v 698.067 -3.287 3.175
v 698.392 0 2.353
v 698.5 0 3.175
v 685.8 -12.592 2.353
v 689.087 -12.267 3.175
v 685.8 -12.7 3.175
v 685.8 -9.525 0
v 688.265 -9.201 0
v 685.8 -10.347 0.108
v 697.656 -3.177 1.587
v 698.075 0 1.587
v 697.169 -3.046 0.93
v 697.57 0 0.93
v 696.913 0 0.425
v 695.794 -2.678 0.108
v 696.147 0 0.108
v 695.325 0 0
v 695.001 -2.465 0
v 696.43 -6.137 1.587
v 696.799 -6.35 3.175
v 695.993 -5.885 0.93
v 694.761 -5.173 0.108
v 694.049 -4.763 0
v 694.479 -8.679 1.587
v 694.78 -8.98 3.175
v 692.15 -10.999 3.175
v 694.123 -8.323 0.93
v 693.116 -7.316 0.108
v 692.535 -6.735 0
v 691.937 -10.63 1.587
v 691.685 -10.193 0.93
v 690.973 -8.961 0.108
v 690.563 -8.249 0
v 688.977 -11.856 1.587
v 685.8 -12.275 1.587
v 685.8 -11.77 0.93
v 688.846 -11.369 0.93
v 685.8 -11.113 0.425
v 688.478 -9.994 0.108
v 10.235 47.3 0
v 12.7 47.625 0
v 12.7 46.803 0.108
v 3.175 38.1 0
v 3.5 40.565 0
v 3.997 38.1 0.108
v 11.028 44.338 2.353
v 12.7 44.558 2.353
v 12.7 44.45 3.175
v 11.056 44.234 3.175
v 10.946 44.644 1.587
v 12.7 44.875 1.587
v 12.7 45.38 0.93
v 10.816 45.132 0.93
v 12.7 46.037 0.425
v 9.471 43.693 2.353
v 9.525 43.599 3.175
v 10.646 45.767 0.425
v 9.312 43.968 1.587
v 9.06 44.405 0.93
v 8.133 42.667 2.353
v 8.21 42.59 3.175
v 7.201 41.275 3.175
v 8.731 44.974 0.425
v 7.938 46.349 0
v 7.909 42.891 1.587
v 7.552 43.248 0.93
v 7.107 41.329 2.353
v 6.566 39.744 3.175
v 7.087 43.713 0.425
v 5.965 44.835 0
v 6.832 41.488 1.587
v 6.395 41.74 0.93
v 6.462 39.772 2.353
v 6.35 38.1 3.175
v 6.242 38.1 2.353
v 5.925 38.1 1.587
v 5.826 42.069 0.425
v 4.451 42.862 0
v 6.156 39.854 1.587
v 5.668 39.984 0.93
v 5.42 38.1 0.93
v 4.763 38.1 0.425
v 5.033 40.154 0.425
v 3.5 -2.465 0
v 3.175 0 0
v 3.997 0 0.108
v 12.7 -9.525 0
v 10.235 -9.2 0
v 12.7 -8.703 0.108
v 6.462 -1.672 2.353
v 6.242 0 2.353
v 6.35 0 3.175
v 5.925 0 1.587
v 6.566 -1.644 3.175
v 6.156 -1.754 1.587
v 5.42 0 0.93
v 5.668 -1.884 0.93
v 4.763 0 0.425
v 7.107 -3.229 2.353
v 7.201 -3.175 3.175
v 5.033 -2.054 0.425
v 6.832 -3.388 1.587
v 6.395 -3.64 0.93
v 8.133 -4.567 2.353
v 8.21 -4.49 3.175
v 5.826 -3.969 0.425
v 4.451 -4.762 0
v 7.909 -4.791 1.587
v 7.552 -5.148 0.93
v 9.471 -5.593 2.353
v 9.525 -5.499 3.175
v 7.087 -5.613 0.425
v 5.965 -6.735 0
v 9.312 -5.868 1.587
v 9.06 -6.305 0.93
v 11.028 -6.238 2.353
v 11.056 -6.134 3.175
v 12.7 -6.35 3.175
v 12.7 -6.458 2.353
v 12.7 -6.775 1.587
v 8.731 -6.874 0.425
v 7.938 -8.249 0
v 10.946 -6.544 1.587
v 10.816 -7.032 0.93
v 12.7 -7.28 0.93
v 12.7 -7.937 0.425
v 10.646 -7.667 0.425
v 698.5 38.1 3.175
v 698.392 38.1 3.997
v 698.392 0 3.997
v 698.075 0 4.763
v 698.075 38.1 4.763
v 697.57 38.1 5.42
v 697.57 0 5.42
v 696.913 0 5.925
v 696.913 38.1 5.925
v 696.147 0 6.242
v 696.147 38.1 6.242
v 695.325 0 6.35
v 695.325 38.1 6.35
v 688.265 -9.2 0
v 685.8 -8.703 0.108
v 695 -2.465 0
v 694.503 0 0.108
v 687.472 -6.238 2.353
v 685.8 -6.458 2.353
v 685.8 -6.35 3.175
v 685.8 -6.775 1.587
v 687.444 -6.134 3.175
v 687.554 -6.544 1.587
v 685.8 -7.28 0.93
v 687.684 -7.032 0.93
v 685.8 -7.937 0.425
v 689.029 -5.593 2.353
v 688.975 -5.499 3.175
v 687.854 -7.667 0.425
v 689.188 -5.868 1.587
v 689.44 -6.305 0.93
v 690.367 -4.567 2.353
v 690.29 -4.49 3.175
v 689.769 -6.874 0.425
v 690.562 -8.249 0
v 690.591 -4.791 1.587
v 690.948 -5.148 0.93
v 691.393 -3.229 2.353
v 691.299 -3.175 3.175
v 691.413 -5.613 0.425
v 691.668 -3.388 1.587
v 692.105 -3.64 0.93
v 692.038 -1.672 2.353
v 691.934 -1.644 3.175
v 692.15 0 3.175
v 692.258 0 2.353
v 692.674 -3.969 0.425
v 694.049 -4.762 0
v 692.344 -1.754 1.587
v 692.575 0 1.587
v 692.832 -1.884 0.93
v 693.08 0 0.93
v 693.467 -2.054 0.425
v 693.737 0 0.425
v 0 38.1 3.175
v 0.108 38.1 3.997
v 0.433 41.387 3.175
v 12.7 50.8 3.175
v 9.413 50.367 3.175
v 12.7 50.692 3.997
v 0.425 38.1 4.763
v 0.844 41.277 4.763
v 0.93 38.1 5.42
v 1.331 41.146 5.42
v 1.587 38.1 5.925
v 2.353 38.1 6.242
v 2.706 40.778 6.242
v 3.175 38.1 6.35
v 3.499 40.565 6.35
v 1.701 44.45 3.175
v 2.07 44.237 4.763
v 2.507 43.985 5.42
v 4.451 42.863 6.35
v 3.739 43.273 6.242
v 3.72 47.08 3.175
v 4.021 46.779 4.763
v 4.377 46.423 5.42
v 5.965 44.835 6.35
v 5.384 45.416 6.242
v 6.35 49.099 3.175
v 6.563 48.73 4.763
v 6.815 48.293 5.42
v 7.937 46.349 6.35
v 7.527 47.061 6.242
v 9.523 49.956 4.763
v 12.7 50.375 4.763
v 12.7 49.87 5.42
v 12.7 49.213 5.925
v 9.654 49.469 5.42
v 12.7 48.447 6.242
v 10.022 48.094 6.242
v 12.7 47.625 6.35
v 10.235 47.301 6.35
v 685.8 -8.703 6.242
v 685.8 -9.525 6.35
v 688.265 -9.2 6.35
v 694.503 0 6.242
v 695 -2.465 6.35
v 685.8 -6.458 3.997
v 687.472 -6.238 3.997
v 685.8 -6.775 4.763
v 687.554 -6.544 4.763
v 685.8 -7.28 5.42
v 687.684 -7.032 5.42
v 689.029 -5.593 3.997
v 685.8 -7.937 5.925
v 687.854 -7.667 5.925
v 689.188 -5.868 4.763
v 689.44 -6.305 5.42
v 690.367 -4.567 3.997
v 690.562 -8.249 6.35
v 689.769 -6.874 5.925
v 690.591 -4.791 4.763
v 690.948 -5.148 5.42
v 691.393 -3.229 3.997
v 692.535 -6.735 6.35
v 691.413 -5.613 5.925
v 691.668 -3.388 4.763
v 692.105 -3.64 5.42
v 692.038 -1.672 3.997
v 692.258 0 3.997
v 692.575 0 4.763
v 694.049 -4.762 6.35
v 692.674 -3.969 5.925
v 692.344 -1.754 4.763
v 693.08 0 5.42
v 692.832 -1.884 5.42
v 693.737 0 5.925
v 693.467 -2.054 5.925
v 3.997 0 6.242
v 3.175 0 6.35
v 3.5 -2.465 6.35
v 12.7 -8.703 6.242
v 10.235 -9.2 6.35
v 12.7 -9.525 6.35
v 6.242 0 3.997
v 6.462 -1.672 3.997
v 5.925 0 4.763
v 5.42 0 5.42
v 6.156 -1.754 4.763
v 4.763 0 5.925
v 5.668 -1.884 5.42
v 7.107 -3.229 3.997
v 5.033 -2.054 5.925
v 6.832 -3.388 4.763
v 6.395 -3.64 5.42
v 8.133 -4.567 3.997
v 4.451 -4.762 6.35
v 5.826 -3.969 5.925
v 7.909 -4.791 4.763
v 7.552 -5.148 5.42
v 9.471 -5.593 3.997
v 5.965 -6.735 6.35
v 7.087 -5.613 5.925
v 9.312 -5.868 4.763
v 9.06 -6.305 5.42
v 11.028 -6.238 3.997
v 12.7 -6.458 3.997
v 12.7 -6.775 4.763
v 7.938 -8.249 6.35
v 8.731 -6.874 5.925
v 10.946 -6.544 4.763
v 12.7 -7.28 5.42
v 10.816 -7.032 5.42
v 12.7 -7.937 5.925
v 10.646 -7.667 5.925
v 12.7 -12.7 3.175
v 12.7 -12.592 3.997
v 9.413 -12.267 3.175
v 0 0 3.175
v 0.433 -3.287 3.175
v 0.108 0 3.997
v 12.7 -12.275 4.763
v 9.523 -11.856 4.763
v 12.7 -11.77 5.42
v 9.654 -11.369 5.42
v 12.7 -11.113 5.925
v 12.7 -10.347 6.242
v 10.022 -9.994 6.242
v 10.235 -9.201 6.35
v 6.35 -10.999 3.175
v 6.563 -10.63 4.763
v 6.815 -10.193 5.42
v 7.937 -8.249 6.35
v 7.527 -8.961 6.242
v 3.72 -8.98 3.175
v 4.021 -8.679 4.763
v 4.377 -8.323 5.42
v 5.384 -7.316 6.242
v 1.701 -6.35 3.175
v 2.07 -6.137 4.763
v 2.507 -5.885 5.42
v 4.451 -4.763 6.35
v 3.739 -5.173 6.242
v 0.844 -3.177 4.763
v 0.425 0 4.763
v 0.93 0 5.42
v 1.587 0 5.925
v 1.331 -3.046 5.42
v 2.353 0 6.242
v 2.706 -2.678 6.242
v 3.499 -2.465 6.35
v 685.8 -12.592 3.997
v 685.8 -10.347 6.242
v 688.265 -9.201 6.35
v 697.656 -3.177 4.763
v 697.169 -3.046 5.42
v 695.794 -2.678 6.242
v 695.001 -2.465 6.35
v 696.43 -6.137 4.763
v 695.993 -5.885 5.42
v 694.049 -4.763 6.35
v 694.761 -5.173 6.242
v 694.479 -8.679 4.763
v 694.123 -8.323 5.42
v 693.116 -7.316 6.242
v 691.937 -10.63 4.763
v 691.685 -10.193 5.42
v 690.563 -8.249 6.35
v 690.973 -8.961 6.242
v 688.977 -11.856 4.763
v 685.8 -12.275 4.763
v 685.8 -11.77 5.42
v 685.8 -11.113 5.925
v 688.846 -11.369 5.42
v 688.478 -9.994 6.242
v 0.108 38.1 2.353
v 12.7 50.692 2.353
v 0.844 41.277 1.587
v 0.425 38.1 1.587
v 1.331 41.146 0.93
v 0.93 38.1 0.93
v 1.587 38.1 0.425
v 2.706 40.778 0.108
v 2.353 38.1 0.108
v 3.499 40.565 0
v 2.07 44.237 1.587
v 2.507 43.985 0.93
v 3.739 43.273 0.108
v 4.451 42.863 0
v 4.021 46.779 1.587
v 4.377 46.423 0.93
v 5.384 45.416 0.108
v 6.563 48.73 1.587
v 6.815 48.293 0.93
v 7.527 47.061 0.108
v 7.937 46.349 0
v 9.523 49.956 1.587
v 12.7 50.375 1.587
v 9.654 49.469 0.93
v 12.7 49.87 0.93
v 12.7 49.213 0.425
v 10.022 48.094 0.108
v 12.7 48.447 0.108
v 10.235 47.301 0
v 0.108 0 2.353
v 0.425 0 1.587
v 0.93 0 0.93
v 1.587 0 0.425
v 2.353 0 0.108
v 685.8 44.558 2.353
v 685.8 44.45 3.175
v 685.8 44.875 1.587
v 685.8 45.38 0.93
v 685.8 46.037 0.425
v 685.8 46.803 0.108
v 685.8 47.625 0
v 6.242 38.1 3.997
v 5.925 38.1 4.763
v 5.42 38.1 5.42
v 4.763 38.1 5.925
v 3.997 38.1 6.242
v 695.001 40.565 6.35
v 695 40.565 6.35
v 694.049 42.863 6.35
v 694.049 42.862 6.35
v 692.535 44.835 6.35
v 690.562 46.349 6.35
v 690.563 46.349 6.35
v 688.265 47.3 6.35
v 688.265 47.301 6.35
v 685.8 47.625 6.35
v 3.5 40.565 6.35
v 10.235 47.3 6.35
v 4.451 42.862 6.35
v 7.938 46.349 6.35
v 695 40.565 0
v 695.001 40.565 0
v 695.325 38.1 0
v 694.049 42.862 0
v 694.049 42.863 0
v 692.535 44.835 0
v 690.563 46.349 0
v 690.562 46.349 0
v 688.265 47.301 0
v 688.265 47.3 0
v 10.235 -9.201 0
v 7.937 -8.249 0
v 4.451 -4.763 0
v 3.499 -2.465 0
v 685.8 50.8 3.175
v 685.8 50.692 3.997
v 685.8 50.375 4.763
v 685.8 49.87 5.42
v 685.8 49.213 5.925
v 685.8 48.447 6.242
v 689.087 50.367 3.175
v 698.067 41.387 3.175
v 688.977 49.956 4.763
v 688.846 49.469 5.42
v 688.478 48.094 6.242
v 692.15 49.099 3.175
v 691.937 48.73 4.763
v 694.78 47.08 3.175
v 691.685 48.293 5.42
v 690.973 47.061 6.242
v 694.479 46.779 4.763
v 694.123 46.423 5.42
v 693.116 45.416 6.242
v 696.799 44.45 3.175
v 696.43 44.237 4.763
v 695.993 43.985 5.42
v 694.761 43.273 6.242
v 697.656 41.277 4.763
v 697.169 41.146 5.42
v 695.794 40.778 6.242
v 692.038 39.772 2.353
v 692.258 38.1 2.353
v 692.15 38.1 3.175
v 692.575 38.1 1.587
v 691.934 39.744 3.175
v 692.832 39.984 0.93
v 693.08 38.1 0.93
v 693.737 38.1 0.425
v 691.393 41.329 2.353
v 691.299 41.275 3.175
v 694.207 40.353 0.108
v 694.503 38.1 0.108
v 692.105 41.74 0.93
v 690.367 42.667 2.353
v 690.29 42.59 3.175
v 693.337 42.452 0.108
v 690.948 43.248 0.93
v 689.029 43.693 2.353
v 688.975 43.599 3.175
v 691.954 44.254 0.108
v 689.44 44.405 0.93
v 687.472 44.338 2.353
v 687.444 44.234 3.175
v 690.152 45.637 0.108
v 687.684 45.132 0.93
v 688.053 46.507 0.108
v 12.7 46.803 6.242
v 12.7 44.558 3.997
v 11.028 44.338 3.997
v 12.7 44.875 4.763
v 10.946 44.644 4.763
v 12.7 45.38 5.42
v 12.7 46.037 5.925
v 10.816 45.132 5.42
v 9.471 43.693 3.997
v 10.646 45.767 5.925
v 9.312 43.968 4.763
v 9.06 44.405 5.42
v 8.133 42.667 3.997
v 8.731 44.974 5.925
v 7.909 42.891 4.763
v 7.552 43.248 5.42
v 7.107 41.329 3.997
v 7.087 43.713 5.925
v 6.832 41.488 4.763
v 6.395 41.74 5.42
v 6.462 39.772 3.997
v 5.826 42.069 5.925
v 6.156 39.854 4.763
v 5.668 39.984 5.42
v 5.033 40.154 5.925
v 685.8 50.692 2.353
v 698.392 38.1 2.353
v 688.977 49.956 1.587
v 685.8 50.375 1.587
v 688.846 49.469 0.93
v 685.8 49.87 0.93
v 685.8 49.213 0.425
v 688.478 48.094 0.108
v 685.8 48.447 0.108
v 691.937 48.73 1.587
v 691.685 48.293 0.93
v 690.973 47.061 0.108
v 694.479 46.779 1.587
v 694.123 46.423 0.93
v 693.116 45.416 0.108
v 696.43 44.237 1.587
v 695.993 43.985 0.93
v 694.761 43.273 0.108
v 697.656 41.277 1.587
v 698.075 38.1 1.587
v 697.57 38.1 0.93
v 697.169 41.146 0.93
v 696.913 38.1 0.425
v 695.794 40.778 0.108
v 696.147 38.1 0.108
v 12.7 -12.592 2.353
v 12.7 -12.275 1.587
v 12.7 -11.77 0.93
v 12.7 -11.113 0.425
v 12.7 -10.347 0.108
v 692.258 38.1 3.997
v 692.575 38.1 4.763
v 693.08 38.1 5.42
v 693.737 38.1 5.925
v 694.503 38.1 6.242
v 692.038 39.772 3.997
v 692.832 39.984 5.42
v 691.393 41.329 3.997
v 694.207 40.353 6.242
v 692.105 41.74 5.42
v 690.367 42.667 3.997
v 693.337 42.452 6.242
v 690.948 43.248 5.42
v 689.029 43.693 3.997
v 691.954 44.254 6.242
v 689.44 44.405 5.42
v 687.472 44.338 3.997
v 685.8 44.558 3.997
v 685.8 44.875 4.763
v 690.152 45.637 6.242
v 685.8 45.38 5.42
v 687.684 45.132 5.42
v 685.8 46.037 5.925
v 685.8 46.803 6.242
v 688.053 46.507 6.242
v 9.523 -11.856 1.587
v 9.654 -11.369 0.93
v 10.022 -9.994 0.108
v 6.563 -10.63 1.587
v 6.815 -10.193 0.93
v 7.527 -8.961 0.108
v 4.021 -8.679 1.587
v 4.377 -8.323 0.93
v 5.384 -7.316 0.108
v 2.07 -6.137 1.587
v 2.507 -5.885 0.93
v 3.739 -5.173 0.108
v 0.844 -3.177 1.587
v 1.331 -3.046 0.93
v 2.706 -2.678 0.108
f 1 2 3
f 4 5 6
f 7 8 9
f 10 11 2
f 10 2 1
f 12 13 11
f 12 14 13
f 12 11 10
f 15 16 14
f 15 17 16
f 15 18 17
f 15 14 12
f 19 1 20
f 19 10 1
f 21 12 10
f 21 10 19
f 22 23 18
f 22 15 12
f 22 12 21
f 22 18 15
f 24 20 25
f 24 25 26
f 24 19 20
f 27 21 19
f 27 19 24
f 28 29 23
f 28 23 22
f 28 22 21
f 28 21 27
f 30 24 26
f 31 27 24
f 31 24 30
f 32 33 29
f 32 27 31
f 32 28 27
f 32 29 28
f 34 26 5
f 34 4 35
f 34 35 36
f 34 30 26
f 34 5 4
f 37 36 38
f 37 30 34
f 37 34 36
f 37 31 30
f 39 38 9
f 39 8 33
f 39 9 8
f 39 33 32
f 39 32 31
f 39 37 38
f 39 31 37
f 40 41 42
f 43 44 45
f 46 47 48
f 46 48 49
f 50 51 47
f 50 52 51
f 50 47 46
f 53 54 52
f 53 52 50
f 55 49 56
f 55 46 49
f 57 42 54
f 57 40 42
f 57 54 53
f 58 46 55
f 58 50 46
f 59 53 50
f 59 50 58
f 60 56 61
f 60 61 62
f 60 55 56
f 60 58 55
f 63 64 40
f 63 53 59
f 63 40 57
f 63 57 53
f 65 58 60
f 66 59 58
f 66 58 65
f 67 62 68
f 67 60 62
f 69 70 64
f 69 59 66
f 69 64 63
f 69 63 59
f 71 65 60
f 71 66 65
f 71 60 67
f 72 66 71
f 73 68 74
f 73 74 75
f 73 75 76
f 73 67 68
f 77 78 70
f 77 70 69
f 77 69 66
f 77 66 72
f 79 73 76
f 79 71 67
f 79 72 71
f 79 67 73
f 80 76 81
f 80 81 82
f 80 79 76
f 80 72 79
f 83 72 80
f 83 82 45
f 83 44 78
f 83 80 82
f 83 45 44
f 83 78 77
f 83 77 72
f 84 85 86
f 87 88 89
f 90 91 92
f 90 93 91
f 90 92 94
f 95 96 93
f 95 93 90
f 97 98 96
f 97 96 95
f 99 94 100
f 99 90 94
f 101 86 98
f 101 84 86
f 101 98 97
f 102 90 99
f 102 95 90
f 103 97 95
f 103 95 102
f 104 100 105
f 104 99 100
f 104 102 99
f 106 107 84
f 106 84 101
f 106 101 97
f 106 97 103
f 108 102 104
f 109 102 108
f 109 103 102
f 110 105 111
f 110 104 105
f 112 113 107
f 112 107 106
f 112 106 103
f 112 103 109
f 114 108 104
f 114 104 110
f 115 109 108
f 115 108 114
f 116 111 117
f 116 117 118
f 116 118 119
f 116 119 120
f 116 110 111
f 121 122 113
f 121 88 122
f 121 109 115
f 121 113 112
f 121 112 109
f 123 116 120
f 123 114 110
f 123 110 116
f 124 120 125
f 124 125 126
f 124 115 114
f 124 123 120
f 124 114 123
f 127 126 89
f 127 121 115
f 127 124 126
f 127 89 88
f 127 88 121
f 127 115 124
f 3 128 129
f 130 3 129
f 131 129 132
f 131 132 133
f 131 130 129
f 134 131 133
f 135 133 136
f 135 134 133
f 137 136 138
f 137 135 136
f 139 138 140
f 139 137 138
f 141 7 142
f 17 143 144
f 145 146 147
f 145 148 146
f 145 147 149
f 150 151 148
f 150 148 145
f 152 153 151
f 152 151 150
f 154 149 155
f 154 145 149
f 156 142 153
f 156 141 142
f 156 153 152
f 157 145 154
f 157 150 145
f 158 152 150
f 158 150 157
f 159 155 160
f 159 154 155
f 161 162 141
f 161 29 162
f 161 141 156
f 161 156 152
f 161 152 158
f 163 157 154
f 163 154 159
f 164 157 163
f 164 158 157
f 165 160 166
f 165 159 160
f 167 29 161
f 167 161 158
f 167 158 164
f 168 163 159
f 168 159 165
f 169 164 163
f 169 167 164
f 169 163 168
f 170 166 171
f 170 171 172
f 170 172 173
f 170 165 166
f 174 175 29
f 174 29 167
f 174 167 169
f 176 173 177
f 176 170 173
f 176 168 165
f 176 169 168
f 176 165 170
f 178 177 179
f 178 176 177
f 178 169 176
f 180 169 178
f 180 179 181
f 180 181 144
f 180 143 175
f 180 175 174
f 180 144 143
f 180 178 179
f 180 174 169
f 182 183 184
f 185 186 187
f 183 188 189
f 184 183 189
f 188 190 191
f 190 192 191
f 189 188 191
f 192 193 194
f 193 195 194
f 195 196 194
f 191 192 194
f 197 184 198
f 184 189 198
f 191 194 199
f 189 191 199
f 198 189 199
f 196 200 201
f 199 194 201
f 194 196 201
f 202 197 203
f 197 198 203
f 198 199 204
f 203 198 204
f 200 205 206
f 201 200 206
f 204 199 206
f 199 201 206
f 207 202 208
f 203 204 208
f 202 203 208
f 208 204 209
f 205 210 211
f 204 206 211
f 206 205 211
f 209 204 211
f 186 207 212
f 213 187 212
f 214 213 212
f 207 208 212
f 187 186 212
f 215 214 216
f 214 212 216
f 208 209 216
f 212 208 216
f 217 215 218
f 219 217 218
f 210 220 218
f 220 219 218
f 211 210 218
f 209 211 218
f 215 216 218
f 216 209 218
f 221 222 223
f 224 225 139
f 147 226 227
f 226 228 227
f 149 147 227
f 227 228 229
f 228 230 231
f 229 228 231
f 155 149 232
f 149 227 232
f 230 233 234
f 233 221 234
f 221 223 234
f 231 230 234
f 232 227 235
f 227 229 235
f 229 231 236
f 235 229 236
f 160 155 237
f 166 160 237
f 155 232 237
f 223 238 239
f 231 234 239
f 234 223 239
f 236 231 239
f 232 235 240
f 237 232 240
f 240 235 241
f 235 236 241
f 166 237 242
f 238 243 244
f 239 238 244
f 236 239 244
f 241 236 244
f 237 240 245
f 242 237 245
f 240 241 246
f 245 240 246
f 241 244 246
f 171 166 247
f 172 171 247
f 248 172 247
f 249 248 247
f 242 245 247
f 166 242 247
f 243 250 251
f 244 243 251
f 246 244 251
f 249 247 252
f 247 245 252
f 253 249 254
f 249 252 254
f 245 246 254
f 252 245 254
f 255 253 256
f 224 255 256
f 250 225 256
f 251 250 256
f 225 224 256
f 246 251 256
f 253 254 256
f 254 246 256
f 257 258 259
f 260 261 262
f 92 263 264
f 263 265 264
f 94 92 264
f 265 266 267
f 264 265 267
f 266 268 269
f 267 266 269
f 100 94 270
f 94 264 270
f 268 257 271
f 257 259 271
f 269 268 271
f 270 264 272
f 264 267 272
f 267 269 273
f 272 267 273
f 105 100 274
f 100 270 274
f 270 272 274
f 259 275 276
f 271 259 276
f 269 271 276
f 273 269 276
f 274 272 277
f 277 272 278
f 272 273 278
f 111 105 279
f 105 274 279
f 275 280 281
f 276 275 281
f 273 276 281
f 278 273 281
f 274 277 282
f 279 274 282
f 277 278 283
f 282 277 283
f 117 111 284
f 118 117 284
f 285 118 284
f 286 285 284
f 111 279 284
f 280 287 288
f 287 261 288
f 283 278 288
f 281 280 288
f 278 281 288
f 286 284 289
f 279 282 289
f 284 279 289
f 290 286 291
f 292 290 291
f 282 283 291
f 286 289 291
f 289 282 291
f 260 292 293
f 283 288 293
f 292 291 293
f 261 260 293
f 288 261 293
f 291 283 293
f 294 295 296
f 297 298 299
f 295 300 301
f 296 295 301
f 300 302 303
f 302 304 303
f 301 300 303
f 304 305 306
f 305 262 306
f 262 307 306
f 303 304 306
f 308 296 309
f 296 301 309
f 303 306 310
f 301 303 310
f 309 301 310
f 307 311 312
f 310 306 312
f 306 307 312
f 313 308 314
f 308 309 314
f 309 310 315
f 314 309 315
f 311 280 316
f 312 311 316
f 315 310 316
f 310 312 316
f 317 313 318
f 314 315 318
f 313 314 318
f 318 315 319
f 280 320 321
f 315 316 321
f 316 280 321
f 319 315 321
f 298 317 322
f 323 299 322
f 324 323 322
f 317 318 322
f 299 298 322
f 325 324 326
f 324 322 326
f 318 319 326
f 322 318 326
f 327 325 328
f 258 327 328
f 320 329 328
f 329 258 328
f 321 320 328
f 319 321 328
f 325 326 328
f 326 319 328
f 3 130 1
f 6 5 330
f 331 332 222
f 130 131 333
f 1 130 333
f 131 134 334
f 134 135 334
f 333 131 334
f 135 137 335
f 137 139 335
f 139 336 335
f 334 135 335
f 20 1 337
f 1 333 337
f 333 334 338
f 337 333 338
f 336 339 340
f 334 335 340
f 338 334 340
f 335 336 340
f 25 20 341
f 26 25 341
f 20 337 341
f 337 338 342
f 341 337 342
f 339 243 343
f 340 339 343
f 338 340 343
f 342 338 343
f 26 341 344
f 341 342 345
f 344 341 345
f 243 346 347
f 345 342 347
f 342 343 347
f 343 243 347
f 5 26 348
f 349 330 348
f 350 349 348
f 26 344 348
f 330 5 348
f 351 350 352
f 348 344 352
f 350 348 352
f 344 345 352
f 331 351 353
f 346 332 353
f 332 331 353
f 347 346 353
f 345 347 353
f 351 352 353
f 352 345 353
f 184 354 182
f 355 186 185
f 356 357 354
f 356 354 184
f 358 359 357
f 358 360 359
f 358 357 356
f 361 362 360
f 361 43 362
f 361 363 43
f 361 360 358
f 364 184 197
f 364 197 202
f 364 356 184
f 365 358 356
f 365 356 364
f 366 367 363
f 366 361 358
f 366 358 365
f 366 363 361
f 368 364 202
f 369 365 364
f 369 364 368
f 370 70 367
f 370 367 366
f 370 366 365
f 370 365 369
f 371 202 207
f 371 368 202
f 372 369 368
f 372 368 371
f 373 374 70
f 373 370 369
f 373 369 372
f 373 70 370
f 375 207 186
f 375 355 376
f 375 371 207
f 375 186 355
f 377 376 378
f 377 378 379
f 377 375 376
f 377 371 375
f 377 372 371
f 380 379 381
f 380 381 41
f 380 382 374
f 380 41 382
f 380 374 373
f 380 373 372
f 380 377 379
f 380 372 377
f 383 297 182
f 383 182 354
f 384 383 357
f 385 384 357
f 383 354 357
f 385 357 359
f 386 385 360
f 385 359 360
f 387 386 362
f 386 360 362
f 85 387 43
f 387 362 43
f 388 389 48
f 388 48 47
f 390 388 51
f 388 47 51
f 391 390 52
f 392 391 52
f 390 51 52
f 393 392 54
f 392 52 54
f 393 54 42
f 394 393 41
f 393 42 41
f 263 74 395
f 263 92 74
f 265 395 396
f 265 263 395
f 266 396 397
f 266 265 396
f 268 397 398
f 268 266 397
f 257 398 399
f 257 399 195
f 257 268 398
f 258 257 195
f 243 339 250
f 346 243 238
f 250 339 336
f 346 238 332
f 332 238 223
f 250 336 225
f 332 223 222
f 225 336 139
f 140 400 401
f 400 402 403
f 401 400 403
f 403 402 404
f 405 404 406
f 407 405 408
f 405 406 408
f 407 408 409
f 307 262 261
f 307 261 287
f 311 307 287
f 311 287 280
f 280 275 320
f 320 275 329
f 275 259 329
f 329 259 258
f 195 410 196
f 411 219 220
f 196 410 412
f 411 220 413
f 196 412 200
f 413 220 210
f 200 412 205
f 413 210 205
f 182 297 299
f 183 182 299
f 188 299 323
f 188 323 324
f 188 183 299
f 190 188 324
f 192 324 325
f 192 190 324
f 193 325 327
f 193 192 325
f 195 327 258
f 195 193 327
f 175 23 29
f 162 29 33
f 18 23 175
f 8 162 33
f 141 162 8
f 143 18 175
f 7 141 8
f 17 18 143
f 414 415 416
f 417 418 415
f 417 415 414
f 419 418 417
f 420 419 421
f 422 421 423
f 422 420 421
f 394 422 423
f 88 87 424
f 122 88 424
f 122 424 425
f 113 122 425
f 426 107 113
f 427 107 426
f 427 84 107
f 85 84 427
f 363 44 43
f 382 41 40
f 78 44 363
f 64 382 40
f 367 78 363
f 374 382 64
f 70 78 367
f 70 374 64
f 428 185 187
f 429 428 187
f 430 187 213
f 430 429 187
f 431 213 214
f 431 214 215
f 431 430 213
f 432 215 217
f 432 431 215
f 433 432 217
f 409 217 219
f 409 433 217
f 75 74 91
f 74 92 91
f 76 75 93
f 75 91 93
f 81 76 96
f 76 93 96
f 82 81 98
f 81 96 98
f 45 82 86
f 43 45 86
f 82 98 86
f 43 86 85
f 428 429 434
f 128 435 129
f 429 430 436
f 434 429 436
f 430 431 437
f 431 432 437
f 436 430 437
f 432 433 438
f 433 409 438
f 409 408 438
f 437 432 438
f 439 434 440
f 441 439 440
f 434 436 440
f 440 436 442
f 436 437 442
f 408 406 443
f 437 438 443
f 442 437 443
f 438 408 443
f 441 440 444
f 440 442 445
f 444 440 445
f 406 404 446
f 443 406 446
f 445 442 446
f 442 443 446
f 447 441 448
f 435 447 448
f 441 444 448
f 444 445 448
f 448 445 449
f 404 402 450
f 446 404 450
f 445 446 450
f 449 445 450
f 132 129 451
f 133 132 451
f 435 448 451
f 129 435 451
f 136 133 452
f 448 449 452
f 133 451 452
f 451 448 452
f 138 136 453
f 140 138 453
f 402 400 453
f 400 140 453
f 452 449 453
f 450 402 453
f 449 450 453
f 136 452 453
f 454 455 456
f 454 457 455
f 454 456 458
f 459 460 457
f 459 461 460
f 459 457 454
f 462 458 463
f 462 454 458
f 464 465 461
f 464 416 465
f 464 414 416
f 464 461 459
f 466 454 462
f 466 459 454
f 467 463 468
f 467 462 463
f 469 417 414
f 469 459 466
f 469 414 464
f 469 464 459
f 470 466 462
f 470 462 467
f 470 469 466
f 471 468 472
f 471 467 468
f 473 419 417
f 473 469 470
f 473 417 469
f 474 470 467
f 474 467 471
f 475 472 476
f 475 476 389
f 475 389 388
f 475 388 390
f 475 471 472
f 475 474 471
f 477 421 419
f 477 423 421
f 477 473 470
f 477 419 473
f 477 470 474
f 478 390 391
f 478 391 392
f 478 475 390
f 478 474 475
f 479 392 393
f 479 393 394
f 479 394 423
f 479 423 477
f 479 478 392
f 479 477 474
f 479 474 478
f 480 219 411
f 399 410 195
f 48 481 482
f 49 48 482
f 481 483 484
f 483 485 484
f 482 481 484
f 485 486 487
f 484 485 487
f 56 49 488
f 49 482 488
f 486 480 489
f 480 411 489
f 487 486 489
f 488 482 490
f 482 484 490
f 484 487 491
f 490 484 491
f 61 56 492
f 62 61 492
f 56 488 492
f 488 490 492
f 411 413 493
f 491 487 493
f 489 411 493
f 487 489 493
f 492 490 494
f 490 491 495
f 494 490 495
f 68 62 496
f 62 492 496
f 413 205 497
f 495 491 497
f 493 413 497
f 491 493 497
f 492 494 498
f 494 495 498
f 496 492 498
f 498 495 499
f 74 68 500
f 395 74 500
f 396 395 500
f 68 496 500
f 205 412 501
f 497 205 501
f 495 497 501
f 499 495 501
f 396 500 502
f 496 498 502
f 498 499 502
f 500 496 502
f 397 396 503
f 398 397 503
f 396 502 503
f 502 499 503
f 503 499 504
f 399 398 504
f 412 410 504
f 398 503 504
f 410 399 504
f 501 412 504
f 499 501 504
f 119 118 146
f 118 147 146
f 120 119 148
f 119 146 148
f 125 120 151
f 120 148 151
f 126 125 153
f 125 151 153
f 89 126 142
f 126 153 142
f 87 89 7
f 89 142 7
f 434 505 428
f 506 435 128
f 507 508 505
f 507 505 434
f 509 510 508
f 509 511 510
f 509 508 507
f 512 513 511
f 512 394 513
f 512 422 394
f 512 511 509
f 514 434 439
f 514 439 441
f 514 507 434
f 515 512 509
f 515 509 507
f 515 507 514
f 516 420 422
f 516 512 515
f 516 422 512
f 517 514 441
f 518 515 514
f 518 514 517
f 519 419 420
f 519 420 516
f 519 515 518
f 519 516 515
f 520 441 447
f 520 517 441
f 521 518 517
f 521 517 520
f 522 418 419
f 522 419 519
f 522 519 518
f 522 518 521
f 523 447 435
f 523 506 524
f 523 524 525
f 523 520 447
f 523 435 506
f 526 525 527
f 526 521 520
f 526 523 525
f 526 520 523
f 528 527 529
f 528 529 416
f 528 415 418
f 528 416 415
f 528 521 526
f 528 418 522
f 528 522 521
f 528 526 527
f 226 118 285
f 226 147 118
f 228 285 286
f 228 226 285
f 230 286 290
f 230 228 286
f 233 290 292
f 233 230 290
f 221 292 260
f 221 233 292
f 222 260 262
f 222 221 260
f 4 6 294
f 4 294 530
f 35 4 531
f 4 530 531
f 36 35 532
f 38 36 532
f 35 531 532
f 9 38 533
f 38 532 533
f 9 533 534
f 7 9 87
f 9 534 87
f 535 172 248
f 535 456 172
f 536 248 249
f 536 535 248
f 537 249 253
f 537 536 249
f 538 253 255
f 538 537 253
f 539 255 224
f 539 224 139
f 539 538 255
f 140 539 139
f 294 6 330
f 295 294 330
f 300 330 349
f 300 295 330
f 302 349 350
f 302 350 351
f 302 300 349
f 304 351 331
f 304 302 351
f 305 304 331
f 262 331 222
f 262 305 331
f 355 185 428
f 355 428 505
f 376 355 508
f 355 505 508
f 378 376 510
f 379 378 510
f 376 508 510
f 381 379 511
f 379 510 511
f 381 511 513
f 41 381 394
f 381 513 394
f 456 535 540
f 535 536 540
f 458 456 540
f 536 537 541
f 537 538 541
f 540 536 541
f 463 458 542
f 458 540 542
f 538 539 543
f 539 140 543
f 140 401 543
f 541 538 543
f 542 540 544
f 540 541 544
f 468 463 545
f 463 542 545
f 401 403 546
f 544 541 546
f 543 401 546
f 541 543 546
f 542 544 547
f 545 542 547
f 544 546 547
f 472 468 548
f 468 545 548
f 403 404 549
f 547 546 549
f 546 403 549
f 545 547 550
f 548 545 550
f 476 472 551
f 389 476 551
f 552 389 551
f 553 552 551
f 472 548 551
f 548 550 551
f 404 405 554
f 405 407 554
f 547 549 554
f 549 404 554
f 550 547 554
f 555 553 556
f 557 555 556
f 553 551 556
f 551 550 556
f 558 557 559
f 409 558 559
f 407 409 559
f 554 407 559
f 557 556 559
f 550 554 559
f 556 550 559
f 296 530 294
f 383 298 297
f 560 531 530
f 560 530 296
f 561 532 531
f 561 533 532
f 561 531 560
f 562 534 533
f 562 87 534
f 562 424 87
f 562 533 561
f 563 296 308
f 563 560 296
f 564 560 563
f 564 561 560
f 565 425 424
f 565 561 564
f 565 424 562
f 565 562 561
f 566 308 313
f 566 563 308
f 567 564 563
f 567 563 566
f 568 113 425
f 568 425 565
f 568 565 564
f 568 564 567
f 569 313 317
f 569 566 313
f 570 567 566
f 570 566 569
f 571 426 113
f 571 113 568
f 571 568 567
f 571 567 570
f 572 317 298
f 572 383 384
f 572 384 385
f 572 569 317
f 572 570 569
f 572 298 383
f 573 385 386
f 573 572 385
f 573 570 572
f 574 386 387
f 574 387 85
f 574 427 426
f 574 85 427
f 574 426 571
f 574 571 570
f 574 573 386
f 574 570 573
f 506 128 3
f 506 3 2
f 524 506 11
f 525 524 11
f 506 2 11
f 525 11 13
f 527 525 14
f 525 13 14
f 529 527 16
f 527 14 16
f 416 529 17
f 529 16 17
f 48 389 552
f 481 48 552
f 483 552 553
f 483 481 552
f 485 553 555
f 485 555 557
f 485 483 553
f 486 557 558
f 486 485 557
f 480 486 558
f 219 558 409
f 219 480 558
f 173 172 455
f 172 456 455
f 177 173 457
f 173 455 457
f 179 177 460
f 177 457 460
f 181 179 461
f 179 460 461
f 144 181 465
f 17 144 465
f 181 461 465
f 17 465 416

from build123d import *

# Parameters (mm, degrees)
BOSS_EXTRUDE1_DEPTH = 6.35
FILLET3_R           = 3.175


with BuildPart() as part:
    # Sketch2 → Boss-Extrude1 (new body)
    with BuildSketch(Plane.XY):
        with BuildLine():
            Line((0, 0), (0, 38.1))
            ThreePointArc((0, 38.1), (3.719743879, 47.080256121), (12.7, 50.8))
            Line((12.7, 50.8), (685.8, 50.8))
            ThreePointArc((685.8, 50.8), (694.780256121, 47.080256121), (698.5, 38.1))
            Line((698.5, 38.1), (698.5, 0))
            ThreePointArc((698.5, 0), (694.780256121, -8.980256121), (685.8, -12.7))
            Line((685.8, -12.7), (12.7, -12.7))
            ThreePointArc((12.7, -12.7), (3.719743879, -8.980256121), (0, 0))
        make_face()
        with BuildLine():
            Line((6.35, 38.1), (6.35, 0))
            ThreePointArc((6.35, 0), (8.209871939, -4.490128061), (12.7, -6.35))
            Line((12.7, -6.35), (685.8, -6.35))
            ThreePointArc((685.8, -6.35), (690.290128061, -4.490128061), (692.15, 0))
            Line((692.15, 0), (692.15, 38.1))
            ThreePointArc((692.15, 38.1), (690.290128061, 42.590128061), (685.8, 44.45))
            Line((685.8, 44.45), (12.7, 44.45))
            ThreePointArc((12.7, 44.45), (8.209871939, 42.590128061), (6.35, 38.1))
        make_face(mode=Mode.SUBTRACT)
    extrude(amount=BOSS_EXTRUDE1_DEPTH)

    # Fillet3
    fillet3_edges = [part.edges().sort_by_distance(p)[0] for p in [
        (0, 19.05, 6.35),
        (3.719743879, 47.080256121, 6.35),
        (349.25, 50.8, 6.35),
        (694.780256121, 47.080256121, 6.35),
        (698.5, 19.05, 6.35),
        (694.780256121, -8.980256121, 6.35),
        (349.25, -12.7, 6.35),
        (3.719743879, -8.980256121, 6.35),
        (0, 19.05, 0),
        (3.719743879, 47.080256121, 0),
        (349.25, 50.8, 0),
        (694.780256121, 47.080256121, 0),
        (698.5, 19.05, 0),
        (694.780256121, -8.980256121, 0),
        (349.25, -12.7, 0),
        (3.719743879, -8.980256121, 0),
        (349.25, 44.45, 6.35),
        (690.290128061, 42.590128061, 6.35),
        (692.15, 19.05, 6.35),
        (690.290128061, -4.490128061, 6.35),
        (349.25, -6.35, 6.35),
        (8.209871939, -4.490128061, 6.35),
        (6.35, 19.05, 6.35),
        (8.209871939, 42.590128061, 6.35),
        (349.25, 44.45, 0),
        (690.290128061, 42.590128061, 0),
        (692.15, 19.05, 0),
        (690.290128061, -4.490128061, 0),
        (349.25, -6.35, 0),
        (8.209871939, -4.490128061, 0),
        (6.35, 19.05, 0),
        (8.209871939, 42.590128061, 0),
    ]]
    fillet(fillet3_edges, radius=FILLET3_R - 0.0001)  # a hair under: the kernel refuses the full size


solid = part.part
